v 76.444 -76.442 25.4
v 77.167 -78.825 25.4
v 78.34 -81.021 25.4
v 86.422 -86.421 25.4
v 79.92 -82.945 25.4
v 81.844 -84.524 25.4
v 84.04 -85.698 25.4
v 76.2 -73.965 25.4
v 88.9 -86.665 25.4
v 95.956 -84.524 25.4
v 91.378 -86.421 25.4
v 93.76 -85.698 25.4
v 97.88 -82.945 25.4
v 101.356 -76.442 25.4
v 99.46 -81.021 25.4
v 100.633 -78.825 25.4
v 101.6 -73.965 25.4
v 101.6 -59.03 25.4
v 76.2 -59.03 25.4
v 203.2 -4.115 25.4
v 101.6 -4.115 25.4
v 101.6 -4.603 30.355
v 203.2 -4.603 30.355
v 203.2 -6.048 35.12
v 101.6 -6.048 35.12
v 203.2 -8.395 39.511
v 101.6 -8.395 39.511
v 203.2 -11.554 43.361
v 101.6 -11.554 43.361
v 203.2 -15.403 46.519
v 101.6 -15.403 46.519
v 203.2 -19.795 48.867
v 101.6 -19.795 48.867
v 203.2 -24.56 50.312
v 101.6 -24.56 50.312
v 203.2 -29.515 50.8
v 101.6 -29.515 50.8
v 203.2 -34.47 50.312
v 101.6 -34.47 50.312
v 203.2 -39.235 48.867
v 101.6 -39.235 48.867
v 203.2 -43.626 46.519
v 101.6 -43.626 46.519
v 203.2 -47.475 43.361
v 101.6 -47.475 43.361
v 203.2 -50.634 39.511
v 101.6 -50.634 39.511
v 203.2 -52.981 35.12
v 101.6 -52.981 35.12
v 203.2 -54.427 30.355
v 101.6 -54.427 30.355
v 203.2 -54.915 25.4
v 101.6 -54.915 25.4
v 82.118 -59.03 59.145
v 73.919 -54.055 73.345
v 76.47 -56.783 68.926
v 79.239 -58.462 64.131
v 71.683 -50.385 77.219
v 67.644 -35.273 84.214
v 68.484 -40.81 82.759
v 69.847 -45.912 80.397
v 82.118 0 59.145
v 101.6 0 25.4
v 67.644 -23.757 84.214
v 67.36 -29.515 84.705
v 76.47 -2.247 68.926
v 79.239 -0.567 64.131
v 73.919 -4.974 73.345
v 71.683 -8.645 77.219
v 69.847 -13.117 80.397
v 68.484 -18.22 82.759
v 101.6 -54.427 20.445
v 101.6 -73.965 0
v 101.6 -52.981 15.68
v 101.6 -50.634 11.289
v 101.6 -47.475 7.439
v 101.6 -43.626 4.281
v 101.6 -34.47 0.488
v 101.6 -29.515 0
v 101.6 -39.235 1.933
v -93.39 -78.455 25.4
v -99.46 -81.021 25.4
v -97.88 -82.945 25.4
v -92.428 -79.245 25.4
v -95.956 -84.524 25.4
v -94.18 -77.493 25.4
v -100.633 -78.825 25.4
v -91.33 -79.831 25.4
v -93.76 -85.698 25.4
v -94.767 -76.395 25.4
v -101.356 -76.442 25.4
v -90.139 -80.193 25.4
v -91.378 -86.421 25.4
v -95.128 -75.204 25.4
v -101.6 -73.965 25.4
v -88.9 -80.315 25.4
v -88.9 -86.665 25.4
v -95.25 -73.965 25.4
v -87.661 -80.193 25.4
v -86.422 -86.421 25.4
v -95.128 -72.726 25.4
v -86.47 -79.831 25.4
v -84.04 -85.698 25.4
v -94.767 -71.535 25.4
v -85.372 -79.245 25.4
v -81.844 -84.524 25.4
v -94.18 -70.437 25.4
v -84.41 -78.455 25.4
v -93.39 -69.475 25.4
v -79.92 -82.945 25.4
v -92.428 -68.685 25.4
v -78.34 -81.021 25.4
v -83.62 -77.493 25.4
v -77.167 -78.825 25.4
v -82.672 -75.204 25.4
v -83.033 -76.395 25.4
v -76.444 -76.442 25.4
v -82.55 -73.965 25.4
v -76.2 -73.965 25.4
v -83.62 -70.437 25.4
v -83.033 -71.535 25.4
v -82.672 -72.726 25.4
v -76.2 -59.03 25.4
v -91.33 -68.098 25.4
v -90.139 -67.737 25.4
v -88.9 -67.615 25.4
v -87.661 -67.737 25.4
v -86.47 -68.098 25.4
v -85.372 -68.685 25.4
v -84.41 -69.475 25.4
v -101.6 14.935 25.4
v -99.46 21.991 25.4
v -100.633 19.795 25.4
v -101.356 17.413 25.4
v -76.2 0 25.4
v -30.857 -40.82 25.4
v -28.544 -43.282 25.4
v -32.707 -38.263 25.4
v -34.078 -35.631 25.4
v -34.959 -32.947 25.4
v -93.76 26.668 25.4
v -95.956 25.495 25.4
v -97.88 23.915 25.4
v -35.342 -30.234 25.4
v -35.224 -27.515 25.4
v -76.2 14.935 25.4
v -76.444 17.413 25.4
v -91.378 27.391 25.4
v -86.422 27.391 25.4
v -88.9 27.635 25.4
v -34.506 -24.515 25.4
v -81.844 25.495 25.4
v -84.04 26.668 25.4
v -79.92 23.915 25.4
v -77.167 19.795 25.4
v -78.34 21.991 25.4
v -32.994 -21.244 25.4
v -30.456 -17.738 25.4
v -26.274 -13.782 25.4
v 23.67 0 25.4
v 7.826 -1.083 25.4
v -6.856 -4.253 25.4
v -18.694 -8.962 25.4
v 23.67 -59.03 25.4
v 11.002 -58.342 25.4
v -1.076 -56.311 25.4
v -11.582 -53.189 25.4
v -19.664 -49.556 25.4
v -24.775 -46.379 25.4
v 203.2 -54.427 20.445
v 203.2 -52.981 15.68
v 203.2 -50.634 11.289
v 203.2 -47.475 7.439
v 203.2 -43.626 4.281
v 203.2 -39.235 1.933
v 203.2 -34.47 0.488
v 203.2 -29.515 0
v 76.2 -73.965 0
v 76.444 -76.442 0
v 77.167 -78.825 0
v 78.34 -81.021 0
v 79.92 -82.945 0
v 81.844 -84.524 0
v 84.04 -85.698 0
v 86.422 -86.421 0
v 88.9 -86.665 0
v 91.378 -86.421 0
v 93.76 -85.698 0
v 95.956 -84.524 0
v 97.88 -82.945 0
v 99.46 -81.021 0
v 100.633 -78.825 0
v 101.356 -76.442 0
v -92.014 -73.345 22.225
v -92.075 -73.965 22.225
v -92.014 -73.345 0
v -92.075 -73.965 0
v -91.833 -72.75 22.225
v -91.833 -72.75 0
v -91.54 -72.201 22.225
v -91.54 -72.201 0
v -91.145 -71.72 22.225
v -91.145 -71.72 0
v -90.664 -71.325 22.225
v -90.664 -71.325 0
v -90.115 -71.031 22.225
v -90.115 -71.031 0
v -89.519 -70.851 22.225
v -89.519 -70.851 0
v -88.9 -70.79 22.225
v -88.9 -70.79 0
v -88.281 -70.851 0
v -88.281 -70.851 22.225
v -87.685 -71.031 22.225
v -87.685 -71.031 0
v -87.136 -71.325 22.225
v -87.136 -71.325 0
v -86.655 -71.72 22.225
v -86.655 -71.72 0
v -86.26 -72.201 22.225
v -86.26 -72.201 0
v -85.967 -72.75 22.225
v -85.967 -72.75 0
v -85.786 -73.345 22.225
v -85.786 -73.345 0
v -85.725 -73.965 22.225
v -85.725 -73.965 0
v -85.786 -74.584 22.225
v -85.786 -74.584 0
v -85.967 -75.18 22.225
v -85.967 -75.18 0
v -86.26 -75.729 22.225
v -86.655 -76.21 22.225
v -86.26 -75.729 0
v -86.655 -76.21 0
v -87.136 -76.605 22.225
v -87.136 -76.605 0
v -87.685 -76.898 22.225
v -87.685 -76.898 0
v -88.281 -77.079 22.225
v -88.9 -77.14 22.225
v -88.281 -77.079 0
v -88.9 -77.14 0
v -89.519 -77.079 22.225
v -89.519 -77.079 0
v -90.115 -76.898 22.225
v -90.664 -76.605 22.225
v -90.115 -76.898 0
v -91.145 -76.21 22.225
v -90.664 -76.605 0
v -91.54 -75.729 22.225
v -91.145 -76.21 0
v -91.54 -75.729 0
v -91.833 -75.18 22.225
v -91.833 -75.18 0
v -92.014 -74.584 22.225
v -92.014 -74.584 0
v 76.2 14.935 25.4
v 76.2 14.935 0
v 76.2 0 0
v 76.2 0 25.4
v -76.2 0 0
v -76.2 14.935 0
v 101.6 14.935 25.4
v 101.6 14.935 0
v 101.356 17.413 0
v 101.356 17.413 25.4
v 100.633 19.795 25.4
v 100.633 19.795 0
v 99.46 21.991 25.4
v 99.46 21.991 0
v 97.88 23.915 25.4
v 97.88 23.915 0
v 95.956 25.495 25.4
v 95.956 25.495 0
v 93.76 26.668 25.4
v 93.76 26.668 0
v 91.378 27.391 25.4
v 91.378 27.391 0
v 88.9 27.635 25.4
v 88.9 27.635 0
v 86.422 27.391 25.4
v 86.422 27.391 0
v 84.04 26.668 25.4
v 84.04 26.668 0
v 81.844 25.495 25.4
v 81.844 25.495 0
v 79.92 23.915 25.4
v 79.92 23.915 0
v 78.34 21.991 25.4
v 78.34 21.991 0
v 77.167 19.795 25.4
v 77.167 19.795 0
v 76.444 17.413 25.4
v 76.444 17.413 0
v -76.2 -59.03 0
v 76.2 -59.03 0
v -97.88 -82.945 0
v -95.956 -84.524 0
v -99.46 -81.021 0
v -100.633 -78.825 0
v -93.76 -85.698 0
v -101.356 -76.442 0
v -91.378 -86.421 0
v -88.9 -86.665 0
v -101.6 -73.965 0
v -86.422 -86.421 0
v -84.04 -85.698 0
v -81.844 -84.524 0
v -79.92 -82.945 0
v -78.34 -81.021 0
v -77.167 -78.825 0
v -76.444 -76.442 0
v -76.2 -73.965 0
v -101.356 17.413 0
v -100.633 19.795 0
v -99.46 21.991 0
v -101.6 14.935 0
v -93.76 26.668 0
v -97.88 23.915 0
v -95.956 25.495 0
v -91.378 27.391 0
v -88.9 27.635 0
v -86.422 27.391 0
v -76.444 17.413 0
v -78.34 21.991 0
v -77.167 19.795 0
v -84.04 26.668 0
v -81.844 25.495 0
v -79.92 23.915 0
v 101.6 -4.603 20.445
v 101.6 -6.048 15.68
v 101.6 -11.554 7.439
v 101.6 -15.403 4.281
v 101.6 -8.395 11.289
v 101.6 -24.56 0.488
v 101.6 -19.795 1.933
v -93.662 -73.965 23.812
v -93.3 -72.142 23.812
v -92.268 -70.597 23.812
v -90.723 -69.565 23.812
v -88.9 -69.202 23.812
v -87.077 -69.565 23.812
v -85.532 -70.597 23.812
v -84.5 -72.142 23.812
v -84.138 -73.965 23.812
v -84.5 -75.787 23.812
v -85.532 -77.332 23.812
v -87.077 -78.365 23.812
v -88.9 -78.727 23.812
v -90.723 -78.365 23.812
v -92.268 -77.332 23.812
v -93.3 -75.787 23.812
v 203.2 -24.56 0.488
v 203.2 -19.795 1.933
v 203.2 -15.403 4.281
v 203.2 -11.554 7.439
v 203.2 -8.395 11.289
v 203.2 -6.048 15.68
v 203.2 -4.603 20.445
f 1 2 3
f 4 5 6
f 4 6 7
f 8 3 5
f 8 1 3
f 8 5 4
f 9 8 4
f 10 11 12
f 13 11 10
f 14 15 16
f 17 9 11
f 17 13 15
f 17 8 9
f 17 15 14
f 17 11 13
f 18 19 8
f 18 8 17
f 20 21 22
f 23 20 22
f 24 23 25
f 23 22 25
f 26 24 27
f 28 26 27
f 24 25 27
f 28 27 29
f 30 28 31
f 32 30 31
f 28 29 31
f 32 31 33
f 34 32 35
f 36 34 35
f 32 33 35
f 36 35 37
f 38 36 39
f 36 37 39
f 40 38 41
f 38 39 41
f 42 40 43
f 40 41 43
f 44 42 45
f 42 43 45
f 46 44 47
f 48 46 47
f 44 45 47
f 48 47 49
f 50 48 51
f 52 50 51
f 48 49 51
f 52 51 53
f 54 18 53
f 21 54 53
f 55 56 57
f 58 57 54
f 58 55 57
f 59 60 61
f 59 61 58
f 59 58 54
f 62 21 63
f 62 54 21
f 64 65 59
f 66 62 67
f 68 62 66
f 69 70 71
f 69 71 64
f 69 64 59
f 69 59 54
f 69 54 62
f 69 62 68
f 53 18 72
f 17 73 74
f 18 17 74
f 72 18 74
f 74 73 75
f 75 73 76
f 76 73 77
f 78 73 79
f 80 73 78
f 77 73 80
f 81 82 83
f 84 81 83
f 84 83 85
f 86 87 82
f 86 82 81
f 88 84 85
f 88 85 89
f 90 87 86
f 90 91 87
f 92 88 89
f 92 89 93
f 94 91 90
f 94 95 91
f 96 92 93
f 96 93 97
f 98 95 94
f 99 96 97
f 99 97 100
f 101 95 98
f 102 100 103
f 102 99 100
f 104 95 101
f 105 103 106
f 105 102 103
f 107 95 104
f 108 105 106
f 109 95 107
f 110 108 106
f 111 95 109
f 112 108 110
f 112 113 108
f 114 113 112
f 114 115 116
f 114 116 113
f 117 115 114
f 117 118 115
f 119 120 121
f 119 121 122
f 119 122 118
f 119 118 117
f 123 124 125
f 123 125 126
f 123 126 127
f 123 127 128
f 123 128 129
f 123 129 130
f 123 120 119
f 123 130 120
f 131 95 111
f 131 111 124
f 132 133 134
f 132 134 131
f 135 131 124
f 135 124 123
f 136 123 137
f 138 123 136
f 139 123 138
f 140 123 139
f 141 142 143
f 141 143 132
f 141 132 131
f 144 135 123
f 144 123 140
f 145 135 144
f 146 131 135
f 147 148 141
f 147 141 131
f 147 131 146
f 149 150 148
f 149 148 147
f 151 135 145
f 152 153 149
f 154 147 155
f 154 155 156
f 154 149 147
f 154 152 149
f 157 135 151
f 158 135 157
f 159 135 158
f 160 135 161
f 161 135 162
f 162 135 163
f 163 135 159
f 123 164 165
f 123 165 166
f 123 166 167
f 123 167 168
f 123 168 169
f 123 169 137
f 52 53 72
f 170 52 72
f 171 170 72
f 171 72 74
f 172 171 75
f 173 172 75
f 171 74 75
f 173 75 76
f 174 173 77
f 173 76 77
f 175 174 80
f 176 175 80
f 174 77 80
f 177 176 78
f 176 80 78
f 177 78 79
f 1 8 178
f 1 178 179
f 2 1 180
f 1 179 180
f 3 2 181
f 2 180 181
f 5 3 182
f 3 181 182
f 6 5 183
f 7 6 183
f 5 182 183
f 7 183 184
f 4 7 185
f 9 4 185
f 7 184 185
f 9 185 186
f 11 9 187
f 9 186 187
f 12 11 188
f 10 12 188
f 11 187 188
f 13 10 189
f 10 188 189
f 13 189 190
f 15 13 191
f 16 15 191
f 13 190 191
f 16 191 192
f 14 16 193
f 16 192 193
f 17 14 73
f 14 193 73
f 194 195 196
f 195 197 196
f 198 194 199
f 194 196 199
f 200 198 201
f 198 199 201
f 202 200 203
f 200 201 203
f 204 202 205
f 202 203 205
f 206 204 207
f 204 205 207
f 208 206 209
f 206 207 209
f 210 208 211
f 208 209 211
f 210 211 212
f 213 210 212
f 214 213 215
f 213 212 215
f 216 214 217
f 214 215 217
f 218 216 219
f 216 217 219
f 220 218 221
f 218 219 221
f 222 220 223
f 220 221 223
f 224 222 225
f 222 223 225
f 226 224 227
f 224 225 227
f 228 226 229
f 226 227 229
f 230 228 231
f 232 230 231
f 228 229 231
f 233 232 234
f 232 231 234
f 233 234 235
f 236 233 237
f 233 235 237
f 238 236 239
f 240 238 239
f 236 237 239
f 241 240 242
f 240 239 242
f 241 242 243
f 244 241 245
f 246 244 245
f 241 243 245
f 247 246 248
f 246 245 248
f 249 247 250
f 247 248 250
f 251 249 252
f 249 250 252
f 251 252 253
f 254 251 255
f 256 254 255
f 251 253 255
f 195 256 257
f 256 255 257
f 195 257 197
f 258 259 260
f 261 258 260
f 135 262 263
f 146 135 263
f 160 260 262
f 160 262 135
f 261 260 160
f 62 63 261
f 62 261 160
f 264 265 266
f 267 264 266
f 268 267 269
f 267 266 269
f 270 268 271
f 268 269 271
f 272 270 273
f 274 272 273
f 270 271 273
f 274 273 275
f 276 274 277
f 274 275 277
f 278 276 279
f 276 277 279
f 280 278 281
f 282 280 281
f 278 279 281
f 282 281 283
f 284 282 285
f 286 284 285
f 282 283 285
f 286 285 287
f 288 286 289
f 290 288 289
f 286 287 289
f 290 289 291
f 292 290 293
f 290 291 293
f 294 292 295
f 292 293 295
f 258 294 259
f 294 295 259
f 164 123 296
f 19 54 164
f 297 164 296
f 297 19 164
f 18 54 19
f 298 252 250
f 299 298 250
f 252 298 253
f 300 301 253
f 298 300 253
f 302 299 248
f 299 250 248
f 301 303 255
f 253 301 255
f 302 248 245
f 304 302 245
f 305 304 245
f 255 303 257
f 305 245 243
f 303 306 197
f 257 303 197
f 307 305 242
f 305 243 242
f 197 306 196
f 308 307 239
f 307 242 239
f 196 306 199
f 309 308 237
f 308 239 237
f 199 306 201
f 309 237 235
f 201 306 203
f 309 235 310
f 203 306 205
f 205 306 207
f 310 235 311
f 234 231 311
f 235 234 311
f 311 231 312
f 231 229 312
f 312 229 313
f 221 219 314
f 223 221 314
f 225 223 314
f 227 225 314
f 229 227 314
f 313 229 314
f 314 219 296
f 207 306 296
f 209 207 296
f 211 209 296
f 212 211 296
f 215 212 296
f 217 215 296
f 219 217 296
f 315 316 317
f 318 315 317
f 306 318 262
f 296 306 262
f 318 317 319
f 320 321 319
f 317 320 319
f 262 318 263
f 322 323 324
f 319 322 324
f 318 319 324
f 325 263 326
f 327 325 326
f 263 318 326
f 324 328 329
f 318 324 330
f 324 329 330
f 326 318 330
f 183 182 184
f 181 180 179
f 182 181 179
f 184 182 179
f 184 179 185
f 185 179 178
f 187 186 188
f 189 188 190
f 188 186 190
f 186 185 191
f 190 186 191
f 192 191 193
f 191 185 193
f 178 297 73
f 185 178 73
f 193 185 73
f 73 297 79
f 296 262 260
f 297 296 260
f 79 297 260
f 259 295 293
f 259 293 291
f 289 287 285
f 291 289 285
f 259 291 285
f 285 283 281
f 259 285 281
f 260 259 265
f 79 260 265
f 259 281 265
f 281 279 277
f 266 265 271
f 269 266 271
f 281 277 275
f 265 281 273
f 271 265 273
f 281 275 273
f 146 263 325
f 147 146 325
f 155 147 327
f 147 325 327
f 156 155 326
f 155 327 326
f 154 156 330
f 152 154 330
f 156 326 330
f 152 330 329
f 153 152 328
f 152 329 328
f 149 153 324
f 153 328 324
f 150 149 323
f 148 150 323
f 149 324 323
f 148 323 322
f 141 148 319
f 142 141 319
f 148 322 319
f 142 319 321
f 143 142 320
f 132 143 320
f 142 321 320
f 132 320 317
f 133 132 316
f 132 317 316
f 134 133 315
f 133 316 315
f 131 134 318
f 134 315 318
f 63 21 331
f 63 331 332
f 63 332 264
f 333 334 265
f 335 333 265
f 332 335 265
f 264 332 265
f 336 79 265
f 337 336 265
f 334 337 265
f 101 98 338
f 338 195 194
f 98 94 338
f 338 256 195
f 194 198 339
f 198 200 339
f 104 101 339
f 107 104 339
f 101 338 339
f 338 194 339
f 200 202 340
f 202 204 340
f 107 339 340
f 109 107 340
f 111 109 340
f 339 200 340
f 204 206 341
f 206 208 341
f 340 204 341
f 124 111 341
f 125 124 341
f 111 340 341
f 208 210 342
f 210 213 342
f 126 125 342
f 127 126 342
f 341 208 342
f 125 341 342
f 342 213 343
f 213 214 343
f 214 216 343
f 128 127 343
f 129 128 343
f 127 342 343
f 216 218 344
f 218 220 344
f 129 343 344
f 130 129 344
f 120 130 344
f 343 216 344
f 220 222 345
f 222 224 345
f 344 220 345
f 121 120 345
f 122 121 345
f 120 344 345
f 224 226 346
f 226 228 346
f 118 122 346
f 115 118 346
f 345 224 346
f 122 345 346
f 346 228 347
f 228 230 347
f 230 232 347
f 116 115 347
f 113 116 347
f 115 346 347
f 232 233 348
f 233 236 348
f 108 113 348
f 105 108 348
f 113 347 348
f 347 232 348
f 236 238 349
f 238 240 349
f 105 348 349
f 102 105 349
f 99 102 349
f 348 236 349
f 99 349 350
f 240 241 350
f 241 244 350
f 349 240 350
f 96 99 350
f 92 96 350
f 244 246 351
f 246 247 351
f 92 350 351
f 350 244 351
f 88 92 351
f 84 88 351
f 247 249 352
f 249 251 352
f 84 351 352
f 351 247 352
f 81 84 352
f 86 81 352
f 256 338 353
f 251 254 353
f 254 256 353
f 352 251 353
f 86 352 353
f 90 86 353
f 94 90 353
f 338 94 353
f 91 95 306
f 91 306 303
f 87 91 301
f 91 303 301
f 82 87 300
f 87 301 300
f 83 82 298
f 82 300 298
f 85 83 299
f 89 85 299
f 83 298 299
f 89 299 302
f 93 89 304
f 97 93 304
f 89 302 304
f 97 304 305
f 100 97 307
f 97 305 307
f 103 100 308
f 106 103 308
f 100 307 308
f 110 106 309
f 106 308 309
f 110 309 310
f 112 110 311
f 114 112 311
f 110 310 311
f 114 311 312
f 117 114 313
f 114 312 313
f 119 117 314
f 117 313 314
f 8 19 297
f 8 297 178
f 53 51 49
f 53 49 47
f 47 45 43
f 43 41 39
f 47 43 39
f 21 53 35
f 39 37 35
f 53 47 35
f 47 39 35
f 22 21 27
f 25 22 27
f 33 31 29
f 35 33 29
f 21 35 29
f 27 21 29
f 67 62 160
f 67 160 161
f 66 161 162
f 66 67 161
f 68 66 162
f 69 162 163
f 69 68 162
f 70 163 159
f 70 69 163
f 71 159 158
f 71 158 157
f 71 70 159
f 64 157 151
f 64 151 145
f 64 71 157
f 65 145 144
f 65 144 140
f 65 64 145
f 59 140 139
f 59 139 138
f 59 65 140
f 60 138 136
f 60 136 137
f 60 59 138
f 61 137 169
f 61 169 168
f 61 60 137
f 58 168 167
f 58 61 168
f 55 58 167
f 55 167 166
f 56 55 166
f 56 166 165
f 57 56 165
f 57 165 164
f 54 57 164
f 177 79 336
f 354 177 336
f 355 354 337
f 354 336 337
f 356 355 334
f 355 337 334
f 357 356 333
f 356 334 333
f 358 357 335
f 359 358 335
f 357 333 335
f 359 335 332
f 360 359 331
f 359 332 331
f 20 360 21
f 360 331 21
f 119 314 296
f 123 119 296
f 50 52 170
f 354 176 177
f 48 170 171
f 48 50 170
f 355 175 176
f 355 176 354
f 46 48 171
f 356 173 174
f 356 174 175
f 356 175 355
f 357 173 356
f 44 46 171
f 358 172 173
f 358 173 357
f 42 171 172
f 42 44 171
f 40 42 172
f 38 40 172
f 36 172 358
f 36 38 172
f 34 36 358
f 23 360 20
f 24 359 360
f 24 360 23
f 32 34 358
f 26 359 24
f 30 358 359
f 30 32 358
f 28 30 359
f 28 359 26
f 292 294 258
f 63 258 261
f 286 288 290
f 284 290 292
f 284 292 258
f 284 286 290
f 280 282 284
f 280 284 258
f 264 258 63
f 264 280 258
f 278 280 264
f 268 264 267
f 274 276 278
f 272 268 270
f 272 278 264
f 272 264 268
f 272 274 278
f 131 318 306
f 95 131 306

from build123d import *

# Parameters (mm, degrees)
F1_DEPTH        = 25.4
F6_DEPTH        = 101.6
F10_D           = 6.35
F10_CSINK_D     = 12.7
F10_CSINK_ANGLE = 90


with BuildPart() as f1:
    # F0 (on Top) → F1 (new body)
    with BuildSketch(Plane.XY):
        with BuildLine():
            Line((0, -59.0296), (0, 0))
            Line((0, 0), (-76.2, 0))
            Line((-76.2, 0), (-76.2, 14.9352))
            ThreePointArc((-76.2, 14.9352), (-88.9, 27.6352), (-101.6, 14.9352))
            Line((-101.6, 14.9352), (-101.6, -73.9648))
            ThreePointArc((-101.6, -73.9648), (-88.9, -86.6648), (-76.2, -73.9648))
            Line((-76.2, -73.9648), (-76.2, -59.0296))
            Line((-76.2, -59.0296), (0, -59.0296))
        make_face()
        with BuildLine():
            Line((76.2, 0), (0, 0))
            Line((0, 0), (0, -59.0296))
            Line((0, -59.0296), (76.2, -59.0296))
            Line((76.2, -59.0296), (76.2, -73.9648))
            ThreePointArc((76.2, -73.9648), (88.9, -86.6648), (101.6, -73.9648))
            Line((101.6, -73.9648), (101.6, 14.9352))
            ThreePointArc((101.6, 14.9352), (88.9, 27.6352), (76.2, 14.9352))
            Line((76.2, 14.9352), (76.2, 0))
        make_face()
    extrude(amount=F1_DEPTH)

    # F3 (on face) → F4 (join, up to the next surface of F1)
    with BuildSketch(Plane(origin=(87.1985226281, 0, 50.3440905122), x_dir=(0, 1, 0), z_dir=(0.8660254038, 0, 0.5))):
        with BuildLine():
            Line((-59.0296, 10.1618718698), (-59.0296, -28.8029547439))
            Line((-59.0296, -28.8029547439), (0, -28.8029547439))
            Line((0, -28.8029547439), (0, 10.1618718698))
            ThreePointArc((0, 10.1618718698), (-29.5148, 39.6766718698), (-59.0296, 10.1618718698))
        make_face()
    extrude(until=Until.NEXT, dir=(-0.8660254038, 0, -0.5))

    # F5 (on face) → F6 (join)
    with BuildSketch(Plane.YZ.offset(101.6)):
        with BuildLine():
            Line((-54.9148, 25.4), (-4.1148, 25.4))
            ThreePointArc((-4.1148, 25.4), (-29.5148, 50.8), (-54.9148, 25.4))
        make_face()
        with BuildLine():
            ThreePointArc((-29.5148, 0), (-11.5542877579, 7.4394877579), (-4.1148, 25.4))
            Line((-4.1148, 25.4), (-54.9148, 25.4))
            ThreePointArc((-54.9148, 25.4), (-47.4753122421, 7.4394877579), (-29.5148, 0))
        make_face()
    extrude(amount=F6_DEPTH)

    # F10 (through all)
    with Locations(Plane.XY.offset(25.4)):
        with Locations((-88.9, -73.9648)):
            CounterSinkHole(F10_D / 2, F10_CSINK_D / 2, counter_sink_angle=F10_CSINK_ANGLE)


solid = f1.part
